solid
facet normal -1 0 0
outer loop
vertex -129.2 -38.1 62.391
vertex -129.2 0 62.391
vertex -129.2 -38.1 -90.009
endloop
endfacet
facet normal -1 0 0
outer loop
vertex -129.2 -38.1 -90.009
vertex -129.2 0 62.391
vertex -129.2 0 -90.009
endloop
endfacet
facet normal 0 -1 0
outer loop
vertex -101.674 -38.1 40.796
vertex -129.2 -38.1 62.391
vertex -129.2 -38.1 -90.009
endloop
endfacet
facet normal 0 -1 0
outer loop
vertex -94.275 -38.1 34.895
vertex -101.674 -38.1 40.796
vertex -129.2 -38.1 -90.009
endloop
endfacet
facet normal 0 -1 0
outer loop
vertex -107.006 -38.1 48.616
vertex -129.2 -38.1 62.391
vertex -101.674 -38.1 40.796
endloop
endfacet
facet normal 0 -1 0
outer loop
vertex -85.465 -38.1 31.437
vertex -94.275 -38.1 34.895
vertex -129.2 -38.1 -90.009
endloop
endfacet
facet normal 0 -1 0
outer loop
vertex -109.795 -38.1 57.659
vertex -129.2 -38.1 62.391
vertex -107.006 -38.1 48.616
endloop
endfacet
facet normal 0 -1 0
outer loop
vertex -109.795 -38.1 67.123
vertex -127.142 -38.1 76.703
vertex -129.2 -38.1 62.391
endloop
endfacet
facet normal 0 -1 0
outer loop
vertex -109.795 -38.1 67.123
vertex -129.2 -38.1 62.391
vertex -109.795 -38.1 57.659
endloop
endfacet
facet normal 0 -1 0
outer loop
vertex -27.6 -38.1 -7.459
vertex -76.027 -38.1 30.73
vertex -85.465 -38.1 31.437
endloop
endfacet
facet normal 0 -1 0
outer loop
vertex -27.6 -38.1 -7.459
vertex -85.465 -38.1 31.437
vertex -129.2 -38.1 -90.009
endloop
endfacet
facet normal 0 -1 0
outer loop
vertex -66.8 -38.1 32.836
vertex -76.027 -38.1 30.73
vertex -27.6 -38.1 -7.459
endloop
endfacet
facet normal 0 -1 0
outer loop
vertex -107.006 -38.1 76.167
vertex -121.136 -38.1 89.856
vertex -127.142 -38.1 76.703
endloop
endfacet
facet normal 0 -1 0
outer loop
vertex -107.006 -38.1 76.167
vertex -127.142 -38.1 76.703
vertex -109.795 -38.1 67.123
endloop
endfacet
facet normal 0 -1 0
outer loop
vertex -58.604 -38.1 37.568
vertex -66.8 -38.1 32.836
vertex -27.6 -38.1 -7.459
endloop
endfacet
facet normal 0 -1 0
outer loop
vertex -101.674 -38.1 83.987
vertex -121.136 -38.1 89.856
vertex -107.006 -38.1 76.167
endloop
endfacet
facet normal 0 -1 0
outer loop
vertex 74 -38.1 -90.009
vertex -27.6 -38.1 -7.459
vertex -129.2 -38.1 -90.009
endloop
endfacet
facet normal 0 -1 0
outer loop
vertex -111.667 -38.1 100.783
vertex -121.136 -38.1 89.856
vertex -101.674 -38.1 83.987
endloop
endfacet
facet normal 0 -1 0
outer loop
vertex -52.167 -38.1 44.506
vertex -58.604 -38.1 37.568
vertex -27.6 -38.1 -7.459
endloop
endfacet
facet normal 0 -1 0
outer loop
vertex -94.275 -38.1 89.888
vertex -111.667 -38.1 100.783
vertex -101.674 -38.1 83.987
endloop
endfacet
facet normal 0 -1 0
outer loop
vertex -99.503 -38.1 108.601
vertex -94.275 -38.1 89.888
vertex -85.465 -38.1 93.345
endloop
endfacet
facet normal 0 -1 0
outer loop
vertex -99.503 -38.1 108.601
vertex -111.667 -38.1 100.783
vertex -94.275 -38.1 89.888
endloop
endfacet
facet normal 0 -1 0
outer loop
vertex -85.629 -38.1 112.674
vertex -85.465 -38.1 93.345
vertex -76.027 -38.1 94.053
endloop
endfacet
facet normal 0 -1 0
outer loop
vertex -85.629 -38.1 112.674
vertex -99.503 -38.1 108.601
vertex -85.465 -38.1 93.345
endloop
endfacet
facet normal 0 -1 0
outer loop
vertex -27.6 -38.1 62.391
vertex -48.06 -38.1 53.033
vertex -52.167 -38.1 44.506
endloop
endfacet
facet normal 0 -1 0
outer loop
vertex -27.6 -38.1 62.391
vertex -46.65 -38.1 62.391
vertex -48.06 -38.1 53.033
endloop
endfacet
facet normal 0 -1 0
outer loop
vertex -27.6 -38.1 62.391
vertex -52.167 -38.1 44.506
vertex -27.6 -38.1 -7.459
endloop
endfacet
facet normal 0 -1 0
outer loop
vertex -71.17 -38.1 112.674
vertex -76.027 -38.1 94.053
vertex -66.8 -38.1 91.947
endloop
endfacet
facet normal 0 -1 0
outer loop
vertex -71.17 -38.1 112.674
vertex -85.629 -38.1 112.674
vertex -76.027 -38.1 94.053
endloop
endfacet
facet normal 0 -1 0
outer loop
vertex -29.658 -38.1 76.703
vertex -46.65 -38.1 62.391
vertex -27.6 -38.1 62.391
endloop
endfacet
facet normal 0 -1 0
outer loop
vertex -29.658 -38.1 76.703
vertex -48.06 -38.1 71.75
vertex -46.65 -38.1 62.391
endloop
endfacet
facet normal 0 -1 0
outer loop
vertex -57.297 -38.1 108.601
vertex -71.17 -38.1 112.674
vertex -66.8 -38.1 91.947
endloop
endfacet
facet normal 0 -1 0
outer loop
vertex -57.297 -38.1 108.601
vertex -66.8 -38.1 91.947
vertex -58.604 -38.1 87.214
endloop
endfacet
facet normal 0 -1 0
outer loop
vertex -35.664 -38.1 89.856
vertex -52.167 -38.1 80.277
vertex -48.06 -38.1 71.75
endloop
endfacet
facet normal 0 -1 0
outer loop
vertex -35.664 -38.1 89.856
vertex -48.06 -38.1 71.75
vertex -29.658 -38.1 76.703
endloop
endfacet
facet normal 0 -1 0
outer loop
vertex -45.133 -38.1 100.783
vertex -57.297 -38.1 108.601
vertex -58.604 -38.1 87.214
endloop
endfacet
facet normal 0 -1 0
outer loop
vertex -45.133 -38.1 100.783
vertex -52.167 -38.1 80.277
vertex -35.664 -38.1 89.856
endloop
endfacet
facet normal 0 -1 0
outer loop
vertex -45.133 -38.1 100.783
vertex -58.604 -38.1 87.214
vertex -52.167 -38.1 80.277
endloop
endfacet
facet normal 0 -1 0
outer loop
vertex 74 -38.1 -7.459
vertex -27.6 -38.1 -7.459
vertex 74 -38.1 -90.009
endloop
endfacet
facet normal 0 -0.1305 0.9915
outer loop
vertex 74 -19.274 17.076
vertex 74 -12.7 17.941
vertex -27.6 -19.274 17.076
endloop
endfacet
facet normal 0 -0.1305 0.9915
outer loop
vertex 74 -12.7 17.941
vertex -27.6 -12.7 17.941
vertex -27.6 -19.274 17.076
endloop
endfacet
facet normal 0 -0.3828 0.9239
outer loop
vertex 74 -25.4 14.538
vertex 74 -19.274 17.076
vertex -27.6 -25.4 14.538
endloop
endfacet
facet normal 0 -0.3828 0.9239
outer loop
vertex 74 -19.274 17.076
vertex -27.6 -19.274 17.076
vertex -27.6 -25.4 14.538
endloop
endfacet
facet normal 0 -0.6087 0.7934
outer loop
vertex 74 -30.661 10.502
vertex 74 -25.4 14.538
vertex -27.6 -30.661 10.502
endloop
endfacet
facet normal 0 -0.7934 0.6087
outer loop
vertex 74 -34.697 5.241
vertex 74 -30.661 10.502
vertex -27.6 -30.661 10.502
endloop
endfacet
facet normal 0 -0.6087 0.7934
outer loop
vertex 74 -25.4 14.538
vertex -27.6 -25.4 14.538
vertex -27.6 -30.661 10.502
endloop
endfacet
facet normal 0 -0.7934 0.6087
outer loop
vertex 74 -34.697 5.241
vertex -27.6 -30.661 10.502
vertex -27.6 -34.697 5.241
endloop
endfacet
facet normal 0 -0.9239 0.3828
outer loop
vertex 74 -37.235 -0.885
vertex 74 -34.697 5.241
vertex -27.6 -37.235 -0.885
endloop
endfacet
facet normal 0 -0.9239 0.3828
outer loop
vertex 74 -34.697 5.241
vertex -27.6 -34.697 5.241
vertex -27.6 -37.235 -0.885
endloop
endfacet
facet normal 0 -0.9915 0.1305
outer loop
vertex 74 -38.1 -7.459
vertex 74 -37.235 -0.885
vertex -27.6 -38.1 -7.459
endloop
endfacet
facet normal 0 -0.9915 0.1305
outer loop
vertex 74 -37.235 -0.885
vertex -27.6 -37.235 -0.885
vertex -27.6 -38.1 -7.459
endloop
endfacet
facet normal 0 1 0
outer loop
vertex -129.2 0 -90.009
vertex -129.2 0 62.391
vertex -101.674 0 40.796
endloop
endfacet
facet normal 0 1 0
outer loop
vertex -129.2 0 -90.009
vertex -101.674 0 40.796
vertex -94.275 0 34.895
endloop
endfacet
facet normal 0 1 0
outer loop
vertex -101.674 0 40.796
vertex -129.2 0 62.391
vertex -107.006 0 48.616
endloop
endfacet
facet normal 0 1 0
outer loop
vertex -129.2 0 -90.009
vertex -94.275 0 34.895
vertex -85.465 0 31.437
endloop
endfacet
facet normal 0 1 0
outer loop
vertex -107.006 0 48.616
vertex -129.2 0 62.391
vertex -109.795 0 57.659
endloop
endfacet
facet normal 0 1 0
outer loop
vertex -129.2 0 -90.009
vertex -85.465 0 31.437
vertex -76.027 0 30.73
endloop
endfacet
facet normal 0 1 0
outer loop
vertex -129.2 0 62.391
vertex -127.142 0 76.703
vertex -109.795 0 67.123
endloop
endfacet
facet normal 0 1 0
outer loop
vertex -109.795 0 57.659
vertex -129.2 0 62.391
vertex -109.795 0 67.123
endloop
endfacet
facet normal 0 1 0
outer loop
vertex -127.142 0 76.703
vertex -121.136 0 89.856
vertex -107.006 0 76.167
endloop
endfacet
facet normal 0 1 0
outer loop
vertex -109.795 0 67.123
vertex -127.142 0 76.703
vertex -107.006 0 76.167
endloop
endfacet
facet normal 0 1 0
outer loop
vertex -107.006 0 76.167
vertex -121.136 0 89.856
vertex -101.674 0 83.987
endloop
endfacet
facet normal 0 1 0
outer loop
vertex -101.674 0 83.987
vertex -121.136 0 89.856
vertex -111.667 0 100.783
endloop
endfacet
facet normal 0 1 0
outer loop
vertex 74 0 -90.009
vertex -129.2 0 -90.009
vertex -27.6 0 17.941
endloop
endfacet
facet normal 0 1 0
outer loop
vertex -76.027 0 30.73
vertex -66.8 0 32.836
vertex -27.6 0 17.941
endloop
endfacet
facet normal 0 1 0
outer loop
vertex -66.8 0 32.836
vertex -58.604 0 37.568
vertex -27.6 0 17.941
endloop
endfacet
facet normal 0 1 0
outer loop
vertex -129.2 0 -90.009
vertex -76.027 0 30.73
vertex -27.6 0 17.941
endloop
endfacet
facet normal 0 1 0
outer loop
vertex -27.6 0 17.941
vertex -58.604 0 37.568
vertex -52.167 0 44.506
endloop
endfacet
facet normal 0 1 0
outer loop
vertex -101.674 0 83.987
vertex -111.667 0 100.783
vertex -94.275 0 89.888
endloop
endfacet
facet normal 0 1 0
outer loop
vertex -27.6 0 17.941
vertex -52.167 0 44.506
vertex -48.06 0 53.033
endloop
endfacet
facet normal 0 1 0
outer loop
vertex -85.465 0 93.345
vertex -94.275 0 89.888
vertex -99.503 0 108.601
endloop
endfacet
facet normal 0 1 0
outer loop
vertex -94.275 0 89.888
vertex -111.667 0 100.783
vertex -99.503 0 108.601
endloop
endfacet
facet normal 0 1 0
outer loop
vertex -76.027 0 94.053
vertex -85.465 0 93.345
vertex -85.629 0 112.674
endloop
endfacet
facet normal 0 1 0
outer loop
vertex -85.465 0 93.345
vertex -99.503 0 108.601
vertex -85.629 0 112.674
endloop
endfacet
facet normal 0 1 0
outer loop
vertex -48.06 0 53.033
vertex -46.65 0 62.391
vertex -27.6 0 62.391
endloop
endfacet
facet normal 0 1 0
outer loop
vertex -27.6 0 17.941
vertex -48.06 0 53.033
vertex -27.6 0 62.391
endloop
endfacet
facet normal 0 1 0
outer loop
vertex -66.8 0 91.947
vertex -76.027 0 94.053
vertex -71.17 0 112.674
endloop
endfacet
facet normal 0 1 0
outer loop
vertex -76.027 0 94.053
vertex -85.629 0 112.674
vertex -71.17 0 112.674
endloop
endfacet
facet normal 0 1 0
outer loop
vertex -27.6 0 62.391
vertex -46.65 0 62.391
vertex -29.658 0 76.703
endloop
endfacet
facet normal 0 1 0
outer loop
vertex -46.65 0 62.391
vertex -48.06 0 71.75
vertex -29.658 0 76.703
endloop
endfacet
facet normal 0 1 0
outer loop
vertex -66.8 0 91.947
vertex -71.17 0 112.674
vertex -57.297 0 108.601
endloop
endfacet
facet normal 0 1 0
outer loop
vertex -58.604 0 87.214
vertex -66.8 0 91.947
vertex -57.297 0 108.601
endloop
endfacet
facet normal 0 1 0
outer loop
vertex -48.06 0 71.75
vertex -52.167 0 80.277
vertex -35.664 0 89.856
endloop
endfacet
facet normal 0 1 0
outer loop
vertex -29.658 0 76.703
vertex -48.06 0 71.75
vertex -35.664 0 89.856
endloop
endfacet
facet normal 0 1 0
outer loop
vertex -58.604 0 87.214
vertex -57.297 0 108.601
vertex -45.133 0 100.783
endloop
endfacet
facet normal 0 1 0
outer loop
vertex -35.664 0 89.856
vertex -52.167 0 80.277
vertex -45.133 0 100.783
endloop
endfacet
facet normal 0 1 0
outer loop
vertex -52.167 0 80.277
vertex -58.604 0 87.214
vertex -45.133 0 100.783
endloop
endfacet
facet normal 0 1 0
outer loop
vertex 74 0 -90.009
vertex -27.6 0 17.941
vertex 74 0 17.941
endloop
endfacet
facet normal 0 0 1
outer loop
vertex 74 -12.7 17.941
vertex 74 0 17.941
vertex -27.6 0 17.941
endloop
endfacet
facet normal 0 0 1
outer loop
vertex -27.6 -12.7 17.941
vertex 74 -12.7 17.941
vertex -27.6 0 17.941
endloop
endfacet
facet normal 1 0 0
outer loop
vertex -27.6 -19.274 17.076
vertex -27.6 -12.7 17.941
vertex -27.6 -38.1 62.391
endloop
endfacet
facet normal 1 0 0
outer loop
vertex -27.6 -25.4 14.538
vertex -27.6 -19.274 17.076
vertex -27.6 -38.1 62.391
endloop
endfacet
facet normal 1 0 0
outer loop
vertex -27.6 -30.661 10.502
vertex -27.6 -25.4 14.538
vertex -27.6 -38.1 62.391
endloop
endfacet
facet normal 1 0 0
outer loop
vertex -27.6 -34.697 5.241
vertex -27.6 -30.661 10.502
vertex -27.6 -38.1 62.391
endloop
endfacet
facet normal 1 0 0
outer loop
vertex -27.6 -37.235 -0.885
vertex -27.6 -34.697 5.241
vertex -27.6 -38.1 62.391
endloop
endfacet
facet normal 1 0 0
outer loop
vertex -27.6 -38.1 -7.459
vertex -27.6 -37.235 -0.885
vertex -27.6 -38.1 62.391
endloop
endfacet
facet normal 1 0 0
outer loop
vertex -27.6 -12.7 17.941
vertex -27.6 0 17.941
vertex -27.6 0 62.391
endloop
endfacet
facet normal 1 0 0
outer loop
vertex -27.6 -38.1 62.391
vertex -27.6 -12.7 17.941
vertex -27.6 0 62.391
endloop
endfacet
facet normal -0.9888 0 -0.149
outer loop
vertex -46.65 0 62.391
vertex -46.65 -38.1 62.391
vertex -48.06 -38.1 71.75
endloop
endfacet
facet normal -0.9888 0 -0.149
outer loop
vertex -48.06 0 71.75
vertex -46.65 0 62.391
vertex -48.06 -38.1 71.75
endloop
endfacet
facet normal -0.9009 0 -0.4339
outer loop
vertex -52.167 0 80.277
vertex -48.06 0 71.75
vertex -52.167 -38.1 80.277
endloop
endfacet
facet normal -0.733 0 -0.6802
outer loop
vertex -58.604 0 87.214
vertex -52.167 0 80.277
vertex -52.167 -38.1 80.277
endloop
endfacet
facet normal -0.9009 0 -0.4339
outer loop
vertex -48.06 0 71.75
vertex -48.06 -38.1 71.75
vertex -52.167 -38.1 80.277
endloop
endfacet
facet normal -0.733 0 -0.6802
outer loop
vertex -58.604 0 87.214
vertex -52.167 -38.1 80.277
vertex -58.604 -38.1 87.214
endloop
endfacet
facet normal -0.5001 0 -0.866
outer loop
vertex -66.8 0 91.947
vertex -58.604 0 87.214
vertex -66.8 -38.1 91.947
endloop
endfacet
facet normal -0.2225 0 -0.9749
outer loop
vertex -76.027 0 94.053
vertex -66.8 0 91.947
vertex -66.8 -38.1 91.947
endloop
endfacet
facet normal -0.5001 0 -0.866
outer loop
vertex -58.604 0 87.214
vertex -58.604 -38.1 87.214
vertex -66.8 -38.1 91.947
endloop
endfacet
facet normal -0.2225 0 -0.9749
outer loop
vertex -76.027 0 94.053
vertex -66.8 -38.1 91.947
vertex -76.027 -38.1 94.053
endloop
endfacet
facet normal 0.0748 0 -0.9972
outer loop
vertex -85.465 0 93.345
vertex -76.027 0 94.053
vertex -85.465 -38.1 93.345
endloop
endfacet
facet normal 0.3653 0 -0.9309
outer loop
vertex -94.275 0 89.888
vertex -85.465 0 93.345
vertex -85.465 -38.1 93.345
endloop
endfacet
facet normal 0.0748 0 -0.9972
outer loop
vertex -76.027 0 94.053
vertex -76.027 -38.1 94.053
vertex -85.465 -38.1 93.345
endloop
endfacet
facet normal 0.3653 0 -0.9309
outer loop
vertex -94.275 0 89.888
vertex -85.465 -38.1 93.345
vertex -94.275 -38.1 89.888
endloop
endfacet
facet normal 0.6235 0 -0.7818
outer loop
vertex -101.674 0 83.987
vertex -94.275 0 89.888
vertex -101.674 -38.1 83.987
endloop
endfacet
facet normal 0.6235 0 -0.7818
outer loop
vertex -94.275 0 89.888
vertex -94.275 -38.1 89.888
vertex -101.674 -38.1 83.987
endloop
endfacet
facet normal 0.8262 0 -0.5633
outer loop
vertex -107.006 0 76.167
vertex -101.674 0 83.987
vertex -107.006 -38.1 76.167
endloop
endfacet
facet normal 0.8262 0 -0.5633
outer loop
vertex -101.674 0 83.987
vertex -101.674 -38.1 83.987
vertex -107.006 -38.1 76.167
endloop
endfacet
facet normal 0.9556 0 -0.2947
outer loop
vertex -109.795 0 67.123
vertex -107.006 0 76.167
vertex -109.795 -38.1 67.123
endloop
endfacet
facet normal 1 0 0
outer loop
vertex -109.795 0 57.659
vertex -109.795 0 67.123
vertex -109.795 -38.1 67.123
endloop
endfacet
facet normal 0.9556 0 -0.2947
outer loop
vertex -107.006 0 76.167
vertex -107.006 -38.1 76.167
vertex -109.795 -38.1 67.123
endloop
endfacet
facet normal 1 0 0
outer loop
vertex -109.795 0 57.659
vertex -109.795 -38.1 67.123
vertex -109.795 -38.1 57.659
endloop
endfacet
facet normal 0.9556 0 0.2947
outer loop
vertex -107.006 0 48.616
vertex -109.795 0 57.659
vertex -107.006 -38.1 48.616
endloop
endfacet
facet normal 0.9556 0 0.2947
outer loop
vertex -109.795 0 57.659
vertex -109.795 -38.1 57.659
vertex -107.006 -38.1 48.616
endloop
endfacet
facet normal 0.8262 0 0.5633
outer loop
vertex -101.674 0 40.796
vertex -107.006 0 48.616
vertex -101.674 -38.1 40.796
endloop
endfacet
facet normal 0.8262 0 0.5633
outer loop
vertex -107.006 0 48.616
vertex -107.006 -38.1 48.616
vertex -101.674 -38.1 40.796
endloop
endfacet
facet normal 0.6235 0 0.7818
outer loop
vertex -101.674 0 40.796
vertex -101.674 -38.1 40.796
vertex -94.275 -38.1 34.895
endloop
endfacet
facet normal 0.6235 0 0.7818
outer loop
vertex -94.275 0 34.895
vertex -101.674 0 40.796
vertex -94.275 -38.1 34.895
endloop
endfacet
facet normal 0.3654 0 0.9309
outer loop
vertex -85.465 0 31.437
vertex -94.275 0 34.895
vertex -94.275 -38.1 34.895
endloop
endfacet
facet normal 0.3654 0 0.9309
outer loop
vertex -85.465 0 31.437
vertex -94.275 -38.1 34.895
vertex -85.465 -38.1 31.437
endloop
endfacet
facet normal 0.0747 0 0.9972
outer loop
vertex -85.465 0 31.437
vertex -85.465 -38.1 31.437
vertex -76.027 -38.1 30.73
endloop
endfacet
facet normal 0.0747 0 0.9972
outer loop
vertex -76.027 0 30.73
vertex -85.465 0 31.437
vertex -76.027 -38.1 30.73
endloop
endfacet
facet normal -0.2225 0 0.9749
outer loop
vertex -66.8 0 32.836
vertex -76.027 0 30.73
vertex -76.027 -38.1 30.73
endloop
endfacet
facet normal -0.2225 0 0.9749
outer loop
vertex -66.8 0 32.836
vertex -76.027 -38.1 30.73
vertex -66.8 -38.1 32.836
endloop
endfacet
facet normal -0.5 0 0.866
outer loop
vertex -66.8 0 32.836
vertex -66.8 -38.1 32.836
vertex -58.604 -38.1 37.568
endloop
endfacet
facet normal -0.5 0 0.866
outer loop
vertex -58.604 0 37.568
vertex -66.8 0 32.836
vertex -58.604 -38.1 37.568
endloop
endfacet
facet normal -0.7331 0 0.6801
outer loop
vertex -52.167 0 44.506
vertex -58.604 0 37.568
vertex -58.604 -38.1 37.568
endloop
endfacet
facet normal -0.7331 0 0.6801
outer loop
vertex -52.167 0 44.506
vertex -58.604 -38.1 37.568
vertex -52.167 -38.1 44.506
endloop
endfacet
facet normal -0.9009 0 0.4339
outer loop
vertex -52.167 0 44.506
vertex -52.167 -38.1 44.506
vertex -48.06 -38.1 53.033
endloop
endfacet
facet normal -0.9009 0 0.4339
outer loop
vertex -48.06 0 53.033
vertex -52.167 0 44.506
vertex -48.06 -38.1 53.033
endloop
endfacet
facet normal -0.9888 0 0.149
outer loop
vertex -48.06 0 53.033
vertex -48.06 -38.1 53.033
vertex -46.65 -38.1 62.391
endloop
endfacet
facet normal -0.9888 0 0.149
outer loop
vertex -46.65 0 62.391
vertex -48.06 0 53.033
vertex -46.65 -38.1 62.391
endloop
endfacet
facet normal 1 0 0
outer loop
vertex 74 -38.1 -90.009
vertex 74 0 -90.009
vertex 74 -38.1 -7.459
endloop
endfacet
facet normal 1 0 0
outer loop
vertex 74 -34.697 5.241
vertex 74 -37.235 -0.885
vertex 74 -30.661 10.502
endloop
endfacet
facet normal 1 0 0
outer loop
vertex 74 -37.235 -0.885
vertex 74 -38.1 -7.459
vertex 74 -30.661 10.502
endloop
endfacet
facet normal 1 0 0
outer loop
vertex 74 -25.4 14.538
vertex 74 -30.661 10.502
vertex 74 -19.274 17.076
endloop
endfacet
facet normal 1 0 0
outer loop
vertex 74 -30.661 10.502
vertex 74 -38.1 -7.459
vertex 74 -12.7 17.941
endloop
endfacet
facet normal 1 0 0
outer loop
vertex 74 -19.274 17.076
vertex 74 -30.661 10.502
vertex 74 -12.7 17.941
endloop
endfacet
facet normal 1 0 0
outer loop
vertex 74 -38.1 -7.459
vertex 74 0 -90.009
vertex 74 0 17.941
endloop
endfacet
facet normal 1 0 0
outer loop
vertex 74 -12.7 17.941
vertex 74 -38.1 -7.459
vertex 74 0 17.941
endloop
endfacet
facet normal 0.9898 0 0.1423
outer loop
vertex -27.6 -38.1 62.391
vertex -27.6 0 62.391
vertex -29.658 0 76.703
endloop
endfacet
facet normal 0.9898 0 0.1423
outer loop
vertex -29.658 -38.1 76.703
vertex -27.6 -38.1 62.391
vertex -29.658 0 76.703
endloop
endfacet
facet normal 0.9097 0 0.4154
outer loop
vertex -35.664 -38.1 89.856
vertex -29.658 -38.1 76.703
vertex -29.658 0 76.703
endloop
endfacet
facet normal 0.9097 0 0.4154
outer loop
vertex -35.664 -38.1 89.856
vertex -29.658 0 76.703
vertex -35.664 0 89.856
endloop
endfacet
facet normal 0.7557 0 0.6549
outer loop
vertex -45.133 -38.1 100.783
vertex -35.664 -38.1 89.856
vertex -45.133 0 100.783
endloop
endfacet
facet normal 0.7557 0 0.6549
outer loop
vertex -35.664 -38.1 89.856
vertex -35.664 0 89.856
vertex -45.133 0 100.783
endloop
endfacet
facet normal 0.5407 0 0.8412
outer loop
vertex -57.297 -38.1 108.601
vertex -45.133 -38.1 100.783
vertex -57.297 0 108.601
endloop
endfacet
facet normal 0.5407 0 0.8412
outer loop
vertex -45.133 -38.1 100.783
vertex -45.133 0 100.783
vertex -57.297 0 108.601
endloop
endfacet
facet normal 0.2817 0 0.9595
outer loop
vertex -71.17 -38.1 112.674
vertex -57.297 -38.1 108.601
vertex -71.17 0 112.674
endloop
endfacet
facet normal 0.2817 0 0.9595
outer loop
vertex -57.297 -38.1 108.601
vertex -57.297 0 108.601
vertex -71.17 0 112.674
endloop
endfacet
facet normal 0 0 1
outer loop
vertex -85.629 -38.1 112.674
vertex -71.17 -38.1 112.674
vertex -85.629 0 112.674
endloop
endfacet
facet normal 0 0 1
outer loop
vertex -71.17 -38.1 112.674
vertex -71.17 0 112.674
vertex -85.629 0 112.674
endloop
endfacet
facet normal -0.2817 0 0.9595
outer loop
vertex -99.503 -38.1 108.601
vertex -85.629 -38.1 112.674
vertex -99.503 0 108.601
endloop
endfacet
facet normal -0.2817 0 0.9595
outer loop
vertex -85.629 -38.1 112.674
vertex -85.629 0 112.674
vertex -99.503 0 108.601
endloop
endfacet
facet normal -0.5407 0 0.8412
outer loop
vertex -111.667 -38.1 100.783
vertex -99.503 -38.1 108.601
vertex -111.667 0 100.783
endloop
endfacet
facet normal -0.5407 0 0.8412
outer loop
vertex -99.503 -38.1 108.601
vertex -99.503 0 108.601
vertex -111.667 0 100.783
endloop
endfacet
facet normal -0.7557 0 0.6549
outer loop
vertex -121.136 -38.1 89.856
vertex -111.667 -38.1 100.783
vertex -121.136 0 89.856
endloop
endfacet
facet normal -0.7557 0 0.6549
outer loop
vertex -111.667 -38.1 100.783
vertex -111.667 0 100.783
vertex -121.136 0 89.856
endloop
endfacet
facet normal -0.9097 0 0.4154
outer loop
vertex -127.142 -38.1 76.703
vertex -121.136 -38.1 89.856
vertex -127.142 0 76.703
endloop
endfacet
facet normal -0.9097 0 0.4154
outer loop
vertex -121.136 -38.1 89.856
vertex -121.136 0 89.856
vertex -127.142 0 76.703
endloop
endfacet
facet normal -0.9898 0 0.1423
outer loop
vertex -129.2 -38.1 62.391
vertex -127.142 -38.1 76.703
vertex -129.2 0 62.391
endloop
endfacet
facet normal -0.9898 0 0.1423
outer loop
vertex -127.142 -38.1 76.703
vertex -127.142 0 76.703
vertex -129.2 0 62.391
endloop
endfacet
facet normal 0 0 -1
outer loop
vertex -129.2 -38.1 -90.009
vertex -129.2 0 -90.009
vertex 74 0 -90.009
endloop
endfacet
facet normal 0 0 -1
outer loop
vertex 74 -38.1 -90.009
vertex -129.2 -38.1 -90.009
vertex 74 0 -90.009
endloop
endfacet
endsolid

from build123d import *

# Parameters (mm, degrees)
F1_DEPTH = 38.1
F2_R     = 25.4
F3_R     = 31.75
F4_DEPTH = 50.8


with BuildPart() as f1:
    # F0 (on Front) → F1 (new body)
    with BuildSketch(Plane.XZ):
        with BuildLine():
            ThreePointArc((-27.599881, 62.391328), (-78.399881, 113.191328), (-129.199881, 62.391328))
            Line((-129.199881, 62.391328), (-129.199881, -90.008672))
            Line((-129.199881, -90.008672), (74.000119, -90.008672))
            Line((74.000119, -90.008672), (74.000119, 17.941328))
            Line((74.000119, 17.941328), (-27.599881, 17.941328))
            Line((-27.599881, 17.941328), (-27.599881, 62.391328))
        make_face()
    extrude(amount=F1_DEPTH)

    # F2
    f2_edges = [f1.edges().sort_by_distance(p)[0] for p in [
        (23.200119, -38.1, 17.941328),
    ]]
    fillet(f2_edges, radius=F2_R)

    # F3 (on face) → F4 (cut)
    with BuildSketch(Plane.XZ.offset(38.1)):
        with Locations((-78.399881, 62.391328)):
            Circle(F3_R)
    extrude(amount=-F4_DEPTH, mode=Mode.SUBTRACT)


solid = f1.part
